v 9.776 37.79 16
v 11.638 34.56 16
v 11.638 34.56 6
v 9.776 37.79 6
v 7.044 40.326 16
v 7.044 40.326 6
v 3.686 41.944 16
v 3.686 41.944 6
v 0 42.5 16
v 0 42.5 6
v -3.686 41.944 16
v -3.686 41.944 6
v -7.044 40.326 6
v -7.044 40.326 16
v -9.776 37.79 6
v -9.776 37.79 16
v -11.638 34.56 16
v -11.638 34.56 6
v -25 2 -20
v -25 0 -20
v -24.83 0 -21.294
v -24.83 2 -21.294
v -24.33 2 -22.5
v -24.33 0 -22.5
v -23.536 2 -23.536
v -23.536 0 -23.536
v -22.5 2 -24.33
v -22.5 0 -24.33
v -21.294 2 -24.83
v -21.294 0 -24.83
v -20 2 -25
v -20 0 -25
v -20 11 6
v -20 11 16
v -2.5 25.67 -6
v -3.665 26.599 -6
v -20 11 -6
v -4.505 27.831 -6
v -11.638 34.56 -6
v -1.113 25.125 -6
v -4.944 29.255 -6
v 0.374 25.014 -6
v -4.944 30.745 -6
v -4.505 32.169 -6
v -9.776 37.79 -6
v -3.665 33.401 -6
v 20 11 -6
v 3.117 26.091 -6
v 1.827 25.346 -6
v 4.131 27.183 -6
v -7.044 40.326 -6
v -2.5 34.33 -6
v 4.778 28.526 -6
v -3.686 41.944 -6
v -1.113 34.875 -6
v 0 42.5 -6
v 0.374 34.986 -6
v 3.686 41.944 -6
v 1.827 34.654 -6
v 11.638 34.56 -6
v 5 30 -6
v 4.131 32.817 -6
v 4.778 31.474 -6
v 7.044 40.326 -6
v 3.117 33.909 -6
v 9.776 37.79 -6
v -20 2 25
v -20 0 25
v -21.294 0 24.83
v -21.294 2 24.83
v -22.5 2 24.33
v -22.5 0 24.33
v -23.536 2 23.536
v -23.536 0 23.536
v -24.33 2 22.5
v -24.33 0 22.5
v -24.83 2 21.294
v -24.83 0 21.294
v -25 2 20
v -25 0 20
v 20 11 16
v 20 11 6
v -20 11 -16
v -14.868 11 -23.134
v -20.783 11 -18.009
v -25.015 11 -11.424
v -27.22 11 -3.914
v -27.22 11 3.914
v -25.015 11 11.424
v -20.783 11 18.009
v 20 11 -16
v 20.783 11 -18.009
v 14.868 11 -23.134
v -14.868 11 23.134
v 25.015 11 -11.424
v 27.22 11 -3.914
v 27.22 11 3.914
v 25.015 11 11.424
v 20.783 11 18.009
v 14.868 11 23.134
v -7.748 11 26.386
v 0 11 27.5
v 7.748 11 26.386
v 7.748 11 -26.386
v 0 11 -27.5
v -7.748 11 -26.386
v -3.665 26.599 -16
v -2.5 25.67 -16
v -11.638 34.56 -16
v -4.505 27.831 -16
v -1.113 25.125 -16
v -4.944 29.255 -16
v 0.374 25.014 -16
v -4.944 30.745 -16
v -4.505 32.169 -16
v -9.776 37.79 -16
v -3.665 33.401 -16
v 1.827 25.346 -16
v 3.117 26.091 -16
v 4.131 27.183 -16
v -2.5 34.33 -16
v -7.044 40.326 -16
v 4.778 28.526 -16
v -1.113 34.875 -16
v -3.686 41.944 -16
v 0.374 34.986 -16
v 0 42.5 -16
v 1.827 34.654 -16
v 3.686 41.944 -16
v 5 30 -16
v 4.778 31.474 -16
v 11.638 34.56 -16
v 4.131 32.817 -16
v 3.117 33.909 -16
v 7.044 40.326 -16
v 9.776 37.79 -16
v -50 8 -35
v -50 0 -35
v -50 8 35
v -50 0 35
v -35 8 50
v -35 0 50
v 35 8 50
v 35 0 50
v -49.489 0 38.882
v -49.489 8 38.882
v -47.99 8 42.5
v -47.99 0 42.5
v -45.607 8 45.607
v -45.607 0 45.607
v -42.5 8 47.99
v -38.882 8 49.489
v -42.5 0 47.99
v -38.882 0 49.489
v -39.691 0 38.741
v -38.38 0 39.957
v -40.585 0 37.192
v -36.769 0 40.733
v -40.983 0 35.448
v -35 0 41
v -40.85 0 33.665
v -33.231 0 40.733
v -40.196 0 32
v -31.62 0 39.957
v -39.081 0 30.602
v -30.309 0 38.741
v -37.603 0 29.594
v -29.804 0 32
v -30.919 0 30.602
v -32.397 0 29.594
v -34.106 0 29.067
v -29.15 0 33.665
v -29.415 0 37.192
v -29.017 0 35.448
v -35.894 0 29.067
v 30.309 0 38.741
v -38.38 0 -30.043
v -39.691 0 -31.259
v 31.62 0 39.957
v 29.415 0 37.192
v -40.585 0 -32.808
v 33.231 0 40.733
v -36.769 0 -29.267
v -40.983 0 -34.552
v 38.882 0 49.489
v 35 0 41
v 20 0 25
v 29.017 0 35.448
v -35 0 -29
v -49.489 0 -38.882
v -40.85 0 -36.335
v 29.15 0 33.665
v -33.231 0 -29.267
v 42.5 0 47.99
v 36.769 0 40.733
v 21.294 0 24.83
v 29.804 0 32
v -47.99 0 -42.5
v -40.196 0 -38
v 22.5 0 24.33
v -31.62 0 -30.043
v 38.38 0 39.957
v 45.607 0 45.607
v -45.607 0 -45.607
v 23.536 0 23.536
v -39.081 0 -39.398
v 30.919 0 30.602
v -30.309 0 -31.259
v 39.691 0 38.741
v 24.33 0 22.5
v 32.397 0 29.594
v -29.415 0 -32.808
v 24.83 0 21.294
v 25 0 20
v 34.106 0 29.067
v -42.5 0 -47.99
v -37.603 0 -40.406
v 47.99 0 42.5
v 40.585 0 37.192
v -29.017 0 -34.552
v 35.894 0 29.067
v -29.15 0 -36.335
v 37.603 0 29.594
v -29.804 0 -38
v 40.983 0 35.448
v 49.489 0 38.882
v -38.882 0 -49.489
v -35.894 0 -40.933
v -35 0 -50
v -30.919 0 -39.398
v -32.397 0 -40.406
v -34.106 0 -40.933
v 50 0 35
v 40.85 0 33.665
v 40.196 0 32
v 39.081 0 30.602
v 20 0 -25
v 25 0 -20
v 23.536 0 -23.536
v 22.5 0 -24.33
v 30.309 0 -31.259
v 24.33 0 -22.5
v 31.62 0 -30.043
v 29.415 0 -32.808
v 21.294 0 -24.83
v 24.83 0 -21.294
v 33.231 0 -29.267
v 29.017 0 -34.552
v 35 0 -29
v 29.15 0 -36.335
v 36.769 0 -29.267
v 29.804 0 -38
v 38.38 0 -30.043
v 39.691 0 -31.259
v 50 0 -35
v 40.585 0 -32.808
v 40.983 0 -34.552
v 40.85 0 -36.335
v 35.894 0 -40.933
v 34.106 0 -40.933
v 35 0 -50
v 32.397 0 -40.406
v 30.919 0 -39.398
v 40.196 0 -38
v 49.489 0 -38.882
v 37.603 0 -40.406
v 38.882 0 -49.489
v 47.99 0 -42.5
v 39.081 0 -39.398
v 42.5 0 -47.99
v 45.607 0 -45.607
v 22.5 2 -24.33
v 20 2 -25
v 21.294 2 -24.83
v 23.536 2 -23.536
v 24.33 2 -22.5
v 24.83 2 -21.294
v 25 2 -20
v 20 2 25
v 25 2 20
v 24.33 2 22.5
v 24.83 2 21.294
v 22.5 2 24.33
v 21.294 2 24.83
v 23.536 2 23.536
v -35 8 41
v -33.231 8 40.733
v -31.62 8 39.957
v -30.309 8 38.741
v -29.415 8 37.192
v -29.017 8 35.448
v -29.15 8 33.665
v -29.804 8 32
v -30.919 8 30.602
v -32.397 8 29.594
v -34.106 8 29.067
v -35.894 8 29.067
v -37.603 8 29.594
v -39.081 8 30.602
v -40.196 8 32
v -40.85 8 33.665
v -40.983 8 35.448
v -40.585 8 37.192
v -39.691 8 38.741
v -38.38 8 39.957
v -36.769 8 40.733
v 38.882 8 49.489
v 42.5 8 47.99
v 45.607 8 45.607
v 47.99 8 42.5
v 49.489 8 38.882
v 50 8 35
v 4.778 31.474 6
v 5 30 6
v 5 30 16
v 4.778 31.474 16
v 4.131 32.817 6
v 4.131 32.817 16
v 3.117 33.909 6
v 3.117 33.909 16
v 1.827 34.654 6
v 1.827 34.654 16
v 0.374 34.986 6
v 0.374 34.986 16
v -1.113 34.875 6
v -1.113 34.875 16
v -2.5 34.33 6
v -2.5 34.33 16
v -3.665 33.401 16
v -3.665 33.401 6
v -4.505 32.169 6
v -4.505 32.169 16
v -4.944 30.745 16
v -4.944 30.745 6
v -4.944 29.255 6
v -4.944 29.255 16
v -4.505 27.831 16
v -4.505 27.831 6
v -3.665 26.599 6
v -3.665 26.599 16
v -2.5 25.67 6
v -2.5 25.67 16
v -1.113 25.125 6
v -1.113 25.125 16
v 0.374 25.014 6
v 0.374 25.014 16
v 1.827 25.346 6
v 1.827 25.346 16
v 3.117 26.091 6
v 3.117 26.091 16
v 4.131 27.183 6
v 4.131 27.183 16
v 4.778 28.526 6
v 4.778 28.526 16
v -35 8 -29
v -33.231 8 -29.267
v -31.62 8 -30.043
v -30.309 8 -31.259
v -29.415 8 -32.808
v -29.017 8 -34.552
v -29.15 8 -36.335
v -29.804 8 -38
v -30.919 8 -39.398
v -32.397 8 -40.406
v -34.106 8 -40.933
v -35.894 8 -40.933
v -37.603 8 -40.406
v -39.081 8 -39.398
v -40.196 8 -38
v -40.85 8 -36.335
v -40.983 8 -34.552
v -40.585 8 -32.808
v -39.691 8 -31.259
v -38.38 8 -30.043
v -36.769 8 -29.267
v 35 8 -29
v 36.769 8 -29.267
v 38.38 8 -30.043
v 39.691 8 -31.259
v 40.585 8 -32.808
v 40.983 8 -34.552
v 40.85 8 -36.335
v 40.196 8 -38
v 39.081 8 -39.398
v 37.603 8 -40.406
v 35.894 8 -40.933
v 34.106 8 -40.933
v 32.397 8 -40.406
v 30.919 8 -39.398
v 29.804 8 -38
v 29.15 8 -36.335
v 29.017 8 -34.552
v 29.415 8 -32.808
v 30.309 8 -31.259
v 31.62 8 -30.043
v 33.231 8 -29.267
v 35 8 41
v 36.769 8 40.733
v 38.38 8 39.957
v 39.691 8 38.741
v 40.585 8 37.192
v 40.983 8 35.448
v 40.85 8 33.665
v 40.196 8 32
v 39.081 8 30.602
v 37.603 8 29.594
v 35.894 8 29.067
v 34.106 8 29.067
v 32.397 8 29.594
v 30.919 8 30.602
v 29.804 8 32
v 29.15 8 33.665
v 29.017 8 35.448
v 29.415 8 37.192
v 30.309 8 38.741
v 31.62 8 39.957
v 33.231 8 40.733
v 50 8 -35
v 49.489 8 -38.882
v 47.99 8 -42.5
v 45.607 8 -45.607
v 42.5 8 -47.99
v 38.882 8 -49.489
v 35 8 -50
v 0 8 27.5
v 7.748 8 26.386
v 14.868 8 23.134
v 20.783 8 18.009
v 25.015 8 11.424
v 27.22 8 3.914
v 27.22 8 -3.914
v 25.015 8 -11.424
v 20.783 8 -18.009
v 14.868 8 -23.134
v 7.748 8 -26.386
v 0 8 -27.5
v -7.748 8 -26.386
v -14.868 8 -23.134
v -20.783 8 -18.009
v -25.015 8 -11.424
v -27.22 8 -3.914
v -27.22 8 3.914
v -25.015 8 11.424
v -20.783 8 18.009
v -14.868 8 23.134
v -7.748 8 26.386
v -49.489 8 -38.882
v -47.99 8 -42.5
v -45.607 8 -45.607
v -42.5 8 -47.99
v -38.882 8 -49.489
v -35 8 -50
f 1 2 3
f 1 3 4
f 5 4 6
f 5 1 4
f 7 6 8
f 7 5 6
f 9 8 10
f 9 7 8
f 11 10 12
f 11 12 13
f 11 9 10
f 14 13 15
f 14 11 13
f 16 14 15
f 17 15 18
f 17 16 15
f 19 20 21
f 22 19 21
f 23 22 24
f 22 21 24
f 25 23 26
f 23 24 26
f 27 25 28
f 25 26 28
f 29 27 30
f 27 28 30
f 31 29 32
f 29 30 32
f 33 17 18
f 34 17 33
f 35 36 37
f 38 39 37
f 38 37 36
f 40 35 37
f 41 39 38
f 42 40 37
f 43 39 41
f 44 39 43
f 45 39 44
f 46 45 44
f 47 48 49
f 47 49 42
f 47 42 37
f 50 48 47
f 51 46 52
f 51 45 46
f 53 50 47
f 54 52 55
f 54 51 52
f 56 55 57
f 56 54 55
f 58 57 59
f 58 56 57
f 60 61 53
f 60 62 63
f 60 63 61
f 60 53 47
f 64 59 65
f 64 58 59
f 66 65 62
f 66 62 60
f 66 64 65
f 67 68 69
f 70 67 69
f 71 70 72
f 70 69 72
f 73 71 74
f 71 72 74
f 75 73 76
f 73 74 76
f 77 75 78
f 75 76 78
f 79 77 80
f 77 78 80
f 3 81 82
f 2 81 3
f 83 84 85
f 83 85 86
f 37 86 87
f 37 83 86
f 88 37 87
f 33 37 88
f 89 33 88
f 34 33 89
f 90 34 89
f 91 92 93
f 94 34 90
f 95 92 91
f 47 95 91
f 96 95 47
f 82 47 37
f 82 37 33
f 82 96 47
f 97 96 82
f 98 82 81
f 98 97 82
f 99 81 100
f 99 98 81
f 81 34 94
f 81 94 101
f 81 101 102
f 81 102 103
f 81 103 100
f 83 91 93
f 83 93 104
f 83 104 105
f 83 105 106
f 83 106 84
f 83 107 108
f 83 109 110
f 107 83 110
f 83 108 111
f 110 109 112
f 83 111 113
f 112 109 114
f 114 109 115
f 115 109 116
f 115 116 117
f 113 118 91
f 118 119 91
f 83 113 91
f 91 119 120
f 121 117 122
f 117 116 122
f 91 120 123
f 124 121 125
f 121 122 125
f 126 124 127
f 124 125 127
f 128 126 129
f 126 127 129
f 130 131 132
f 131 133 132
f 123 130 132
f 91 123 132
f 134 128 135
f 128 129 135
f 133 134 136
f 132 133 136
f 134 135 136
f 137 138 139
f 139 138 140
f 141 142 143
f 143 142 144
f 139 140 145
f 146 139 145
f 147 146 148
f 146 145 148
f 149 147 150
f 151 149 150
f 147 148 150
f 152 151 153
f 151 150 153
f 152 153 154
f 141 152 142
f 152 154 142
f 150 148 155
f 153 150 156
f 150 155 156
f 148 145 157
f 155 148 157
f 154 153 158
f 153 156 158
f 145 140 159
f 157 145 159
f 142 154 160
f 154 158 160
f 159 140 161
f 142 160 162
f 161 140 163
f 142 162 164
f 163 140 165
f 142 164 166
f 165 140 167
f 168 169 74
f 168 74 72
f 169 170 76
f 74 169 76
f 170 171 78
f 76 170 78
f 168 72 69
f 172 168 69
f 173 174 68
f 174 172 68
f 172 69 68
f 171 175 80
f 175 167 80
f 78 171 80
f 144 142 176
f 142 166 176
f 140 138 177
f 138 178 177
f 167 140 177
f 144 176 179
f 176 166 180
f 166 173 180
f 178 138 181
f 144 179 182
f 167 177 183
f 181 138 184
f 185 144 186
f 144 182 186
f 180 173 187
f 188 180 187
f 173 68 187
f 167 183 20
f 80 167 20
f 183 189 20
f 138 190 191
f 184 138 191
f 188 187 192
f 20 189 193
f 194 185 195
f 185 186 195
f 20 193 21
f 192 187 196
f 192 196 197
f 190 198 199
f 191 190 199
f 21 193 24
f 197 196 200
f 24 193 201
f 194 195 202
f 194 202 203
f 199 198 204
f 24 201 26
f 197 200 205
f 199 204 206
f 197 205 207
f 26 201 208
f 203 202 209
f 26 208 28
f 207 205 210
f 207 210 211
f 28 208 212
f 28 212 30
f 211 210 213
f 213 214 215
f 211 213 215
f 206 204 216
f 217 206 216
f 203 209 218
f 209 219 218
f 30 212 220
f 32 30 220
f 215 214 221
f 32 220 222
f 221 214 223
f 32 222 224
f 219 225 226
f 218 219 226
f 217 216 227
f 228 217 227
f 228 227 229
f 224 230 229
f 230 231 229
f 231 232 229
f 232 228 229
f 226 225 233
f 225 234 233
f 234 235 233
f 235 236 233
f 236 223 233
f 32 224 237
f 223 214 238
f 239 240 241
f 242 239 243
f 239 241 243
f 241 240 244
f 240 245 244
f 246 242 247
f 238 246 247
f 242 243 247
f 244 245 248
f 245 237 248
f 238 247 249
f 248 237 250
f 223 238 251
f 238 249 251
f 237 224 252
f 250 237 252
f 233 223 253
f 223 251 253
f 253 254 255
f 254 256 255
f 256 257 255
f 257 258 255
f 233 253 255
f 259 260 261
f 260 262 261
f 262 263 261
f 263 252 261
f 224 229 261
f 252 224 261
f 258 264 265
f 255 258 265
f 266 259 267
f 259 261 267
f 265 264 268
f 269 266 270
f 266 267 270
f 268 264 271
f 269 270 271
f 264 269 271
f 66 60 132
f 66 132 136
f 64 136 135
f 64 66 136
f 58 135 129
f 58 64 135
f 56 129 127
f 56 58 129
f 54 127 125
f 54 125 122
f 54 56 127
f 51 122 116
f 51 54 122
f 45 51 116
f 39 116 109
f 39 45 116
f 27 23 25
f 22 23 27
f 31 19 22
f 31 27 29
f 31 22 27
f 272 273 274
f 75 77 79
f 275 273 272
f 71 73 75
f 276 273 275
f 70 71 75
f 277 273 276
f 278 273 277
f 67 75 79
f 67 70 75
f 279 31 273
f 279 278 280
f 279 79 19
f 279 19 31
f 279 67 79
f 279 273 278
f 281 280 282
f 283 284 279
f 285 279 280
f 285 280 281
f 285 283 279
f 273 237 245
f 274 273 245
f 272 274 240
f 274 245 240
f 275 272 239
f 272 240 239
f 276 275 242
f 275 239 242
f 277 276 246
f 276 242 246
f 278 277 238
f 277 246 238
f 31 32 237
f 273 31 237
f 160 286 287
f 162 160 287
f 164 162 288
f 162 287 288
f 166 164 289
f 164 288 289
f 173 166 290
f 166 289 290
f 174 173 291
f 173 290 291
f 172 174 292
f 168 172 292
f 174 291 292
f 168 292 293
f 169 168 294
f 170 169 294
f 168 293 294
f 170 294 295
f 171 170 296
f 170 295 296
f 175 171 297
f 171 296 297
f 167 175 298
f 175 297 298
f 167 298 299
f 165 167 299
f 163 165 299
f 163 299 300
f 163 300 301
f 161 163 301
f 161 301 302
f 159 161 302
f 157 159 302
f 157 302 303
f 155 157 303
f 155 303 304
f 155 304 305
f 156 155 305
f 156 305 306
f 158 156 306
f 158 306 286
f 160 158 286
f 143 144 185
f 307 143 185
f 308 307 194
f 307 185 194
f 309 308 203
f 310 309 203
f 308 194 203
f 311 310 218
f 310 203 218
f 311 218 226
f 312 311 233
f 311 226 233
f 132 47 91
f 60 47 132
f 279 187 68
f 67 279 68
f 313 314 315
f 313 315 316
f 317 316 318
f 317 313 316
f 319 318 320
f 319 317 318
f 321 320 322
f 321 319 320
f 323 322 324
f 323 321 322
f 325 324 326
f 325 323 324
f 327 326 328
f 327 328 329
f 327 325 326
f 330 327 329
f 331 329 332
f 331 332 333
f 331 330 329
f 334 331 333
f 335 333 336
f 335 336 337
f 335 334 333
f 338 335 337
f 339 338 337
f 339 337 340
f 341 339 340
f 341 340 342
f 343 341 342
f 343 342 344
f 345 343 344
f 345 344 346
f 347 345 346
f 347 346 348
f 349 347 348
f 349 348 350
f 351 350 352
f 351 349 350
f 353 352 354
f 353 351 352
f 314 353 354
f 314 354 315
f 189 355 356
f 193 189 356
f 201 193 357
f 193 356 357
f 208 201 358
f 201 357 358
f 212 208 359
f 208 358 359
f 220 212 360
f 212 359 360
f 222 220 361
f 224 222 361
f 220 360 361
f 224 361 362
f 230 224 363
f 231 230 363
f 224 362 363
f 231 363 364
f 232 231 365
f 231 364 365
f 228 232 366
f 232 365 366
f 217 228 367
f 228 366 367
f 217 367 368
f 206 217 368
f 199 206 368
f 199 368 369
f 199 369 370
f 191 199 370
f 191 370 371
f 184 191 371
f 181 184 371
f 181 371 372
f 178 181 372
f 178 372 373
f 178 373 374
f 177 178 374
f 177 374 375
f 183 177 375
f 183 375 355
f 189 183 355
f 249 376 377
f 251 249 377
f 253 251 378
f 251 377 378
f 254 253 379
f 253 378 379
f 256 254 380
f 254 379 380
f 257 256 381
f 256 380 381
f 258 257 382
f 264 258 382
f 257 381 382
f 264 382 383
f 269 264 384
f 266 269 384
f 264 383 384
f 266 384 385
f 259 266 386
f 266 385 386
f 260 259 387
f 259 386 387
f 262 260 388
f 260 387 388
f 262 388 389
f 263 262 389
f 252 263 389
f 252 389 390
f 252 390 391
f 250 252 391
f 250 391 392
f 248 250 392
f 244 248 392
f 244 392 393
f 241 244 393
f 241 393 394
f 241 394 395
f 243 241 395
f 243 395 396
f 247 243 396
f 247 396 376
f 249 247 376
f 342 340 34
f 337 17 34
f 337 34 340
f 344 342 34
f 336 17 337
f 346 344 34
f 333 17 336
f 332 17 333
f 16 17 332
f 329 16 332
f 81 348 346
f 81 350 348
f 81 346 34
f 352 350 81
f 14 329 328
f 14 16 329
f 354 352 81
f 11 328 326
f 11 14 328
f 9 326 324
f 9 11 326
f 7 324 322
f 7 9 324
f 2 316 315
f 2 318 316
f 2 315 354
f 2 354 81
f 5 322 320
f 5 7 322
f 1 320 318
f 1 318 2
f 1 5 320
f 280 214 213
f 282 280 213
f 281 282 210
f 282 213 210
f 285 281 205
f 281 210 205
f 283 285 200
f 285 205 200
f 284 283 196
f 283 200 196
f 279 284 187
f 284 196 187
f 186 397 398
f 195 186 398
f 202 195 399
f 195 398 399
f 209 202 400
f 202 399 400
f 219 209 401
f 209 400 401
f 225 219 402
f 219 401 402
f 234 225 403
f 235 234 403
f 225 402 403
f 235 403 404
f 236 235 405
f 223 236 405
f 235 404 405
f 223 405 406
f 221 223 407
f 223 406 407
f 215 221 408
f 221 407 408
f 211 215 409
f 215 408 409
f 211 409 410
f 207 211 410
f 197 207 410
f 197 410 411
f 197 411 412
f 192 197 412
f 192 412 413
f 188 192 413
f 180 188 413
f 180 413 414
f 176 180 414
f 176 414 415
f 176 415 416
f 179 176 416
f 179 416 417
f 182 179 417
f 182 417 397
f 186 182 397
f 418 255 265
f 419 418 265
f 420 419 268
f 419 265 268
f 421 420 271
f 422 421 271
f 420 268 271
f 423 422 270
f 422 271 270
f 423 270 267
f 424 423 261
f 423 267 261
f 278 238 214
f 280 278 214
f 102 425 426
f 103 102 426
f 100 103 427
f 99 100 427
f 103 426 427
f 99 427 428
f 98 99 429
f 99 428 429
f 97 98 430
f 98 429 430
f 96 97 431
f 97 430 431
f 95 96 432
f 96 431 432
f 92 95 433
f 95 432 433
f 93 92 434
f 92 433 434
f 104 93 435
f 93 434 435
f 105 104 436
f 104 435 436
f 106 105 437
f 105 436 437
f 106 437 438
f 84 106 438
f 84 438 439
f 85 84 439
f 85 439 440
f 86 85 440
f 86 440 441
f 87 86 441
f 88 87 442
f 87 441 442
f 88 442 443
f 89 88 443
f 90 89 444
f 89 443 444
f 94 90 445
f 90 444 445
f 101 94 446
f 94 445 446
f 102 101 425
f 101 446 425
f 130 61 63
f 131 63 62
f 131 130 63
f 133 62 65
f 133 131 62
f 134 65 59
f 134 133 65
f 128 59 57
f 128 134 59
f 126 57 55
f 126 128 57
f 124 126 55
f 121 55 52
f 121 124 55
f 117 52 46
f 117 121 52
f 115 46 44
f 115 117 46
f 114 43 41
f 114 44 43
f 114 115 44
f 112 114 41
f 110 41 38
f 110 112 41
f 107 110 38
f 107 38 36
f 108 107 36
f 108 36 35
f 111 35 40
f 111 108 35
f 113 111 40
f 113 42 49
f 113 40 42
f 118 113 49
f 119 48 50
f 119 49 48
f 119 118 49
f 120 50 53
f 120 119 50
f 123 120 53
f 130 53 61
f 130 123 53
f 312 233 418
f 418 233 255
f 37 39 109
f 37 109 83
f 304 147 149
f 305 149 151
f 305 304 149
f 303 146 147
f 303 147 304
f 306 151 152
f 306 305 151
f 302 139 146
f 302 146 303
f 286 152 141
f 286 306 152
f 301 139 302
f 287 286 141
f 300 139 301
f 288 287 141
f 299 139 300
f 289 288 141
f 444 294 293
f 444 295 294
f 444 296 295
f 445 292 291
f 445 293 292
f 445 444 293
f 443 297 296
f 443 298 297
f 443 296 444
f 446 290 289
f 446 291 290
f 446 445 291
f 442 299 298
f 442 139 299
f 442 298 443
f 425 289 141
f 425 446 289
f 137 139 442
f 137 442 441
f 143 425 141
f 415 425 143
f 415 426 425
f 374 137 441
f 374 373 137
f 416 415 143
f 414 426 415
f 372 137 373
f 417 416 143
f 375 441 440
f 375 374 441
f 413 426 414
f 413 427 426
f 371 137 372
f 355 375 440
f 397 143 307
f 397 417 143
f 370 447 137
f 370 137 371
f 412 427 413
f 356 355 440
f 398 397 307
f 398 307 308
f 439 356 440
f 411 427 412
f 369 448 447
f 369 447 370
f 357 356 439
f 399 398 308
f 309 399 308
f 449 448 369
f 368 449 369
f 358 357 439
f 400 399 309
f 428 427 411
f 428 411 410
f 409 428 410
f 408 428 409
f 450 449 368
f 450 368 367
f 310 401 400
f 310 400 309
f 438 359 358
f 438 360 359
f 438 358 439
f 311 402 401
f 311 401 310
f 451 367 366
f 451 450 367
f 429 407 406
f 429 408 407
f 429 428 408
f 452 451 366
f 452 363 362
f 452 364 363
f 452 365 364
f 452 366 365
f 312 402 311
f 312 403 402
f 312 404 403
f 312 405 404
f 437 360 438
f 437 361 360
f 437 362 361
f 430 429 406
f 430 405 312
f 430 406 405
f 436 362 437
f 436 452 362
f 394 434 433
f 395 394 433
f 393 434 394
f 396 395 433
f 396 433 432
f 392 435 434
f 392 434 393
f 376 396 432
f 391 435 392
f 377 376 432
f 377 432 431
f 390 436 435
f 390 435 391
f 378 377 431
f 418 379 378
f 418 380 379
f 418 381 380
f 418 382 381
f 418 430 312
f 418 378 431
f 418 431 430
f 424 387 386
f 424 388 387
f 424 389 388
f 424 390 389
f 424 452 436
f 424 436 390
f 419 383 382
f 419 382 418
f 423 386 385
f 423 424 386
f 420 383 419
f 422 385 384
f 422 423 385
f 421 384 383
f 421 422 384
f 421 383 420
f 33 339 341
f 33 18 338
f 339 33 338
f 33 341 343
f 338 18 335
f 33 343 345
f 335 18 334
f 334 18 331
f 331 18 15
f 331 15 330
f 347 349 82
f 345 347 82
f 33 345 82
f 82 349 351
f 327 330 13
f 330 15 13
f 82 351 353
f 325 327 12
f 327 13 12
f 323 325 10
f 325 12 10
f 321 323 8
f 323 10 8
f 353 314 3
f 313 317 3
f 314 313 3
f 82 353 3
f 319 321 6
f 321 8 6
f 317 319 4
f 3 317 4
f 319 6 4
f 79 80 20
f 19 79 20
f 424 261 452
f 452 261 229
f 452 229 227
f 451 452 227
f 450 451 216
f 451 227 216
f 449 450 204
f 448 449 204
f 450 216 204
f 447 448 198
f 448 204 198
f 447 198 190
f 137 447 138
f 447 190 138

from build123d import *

# Parameters (mm, degrees)
EXTRUDE_3_DEPTH             = 8
SKETCH_4_R                  = 27.5
EXTRUDE_4_DEPTH             = 3
SKETCH_6_R                  = 6
CUT_EXTRUDE_1_DEPTH         = 72.161787499
PATTERN_LINEAR_1_COUNT      = 2
PATTERN_LINEAR_1_PITCH      = 70
PATTERN_LINEAR_1_COUNT_DIR2 = 2
PATTERN_LINEAR_1_PITCH_DIR2 = 70
CUT_EXTRUDE_2_DEPTH         = 2
SKETCH_13_R                 = 5
EXTRUDE_6_DEPTH             = 16
SKETCH_14_W                 = 40
SKETCH_14_H                 = 35
CUT_EXTRUDE_3_DEPTH         = 6


with BuildPart() as part:
    # 草圖3 → 填料-伸長3 (new body)
    with BuildSketch(Plane(origin=(0, 0, 0), x_dir=(1, 0, 0), z_dir=(0, 1, 0))):
        with BuildLine():
            Line((35, 50), (-35, 50))
            ThreePointArc((-35, 50), (-45.606601718, 45.606601718), (-50, 35))
            Line((-50, 35), (-50, -35))
            ThreePointArc((-50, -35), (-45.606601718, -45.606601718), (-35, -50))
            Line((-35, -50), (35, -50))
            ThreePointArc((35, -50), (45.606601718, -45.606601718), (50, -35))
            Line((50, -35), (50, 35))
            ThreePointArc((50, 35), (45.606601718, 45.606601718), (35, 50))
        make_face()
    extrude(amount=EXTRUDE_3_DEPTH)

    # 草圖4 → 填料-伸長4 (add)
    with BuildSketch(Plane(origin=(0, 8, 0), x_dir=(1, 0, 0), z_dir=(0, 1, 0))):
        with Locations(Location((0, 0, 0), (0, 0, 270))):
            Circle(SKETCH_4_R)
    extrude(amount=EXTRUDE_4_DEPTH)

    # 草圖6 → 除料-伸長1 (cut, through all)
    with BuildSketch(Plane(origin=(0, 8, 0), x_dir=(1, 0, 0), z_dir=(0, 1, 0))):
        with Locations(Location((-35, 35, 0), (0, 0, 270))):
            Circle(SKETCH_6_R)
    cut_extrude_1 = extrude(amount=-CUT_EXTRUDE_1_DEPTH, mode=Mode.SUBTRACT)

    # 直線複製排列1: Cut-Extrude 1 2 × 2
    with Locations(*[(i * PATTERN_LINEAR_1_PITCH, 0, j * PATTERN_LINEAR_1_PITCH_DIR2) for i in range(PATTERN_LINEAR_1_COUNT) for j in range(PATTERN_LINEAR_1_COUNT_DIR2) if (i, j) != (0, 0)]):
        add(cut_extrude_1, mode=Mode.SUBTRACT)

    # 草圖9 → 除料-伸長2 (cut)
    with BuildSketch(Plane.XZ):
        with BuildLine():
            Line((-20, -25), (20, -25))
            ThreePointArc((20, -25), (23.535533906, -23.535533906), (25, -20))
            Line((25, -20), (25, 20))
            ThreePointArc((25, 20), (23.535533906, 23.535533906), (20, 25))
            Line((20, 25), (-20, 25))
            ThreePointArc((-20, 25), (-23.535533906, 23.535533906), (-25, 20))
            Line((-25, 20), (-25, -20))
            ThreePointArc((-25, -20), (-23.535533906, -23.535533906), (-20, -25))
        make_face()
    extrude(amount=-CUT_EXTRUDE_2_DEPTH, mode=Mode.SUBTRACT)

    # 草圖13 → 填料-伸長6 (add, symmetric)
    with BuildSketch(Plane.XY):
        with BuildLine():
            Line((-20, 11), (20, 11))
            Line((20, 11), (11.638479247, 34.560241312))
            ThreePointArc((11.638479247, 34.560241312), (0, 42.5), (-11.638479247, 34.560241312))
            Line((-11.638479247, 34.560241312), (-20, 11))
        make_face()
        with Locations((0, 30)):
            Circle(SKETCH_13_R, mode=Mode.SUBTRACT)
    extrude(amount=EXTRUDE_6_DEPTH, both=True)

    # 草圖14 → 除料-伸長3 (cut, symmetric)
    with BuildSketch(Plane.XY):
        with Locations((0, 28.5)):
            Rectangle(SKETCH_14_W, SKETCH_14_H)
    extrude(amount=CUT_EXTRUDE_3_DEPTH, both=True, mode=Mode.SUBTRACT)


solid = part.part
